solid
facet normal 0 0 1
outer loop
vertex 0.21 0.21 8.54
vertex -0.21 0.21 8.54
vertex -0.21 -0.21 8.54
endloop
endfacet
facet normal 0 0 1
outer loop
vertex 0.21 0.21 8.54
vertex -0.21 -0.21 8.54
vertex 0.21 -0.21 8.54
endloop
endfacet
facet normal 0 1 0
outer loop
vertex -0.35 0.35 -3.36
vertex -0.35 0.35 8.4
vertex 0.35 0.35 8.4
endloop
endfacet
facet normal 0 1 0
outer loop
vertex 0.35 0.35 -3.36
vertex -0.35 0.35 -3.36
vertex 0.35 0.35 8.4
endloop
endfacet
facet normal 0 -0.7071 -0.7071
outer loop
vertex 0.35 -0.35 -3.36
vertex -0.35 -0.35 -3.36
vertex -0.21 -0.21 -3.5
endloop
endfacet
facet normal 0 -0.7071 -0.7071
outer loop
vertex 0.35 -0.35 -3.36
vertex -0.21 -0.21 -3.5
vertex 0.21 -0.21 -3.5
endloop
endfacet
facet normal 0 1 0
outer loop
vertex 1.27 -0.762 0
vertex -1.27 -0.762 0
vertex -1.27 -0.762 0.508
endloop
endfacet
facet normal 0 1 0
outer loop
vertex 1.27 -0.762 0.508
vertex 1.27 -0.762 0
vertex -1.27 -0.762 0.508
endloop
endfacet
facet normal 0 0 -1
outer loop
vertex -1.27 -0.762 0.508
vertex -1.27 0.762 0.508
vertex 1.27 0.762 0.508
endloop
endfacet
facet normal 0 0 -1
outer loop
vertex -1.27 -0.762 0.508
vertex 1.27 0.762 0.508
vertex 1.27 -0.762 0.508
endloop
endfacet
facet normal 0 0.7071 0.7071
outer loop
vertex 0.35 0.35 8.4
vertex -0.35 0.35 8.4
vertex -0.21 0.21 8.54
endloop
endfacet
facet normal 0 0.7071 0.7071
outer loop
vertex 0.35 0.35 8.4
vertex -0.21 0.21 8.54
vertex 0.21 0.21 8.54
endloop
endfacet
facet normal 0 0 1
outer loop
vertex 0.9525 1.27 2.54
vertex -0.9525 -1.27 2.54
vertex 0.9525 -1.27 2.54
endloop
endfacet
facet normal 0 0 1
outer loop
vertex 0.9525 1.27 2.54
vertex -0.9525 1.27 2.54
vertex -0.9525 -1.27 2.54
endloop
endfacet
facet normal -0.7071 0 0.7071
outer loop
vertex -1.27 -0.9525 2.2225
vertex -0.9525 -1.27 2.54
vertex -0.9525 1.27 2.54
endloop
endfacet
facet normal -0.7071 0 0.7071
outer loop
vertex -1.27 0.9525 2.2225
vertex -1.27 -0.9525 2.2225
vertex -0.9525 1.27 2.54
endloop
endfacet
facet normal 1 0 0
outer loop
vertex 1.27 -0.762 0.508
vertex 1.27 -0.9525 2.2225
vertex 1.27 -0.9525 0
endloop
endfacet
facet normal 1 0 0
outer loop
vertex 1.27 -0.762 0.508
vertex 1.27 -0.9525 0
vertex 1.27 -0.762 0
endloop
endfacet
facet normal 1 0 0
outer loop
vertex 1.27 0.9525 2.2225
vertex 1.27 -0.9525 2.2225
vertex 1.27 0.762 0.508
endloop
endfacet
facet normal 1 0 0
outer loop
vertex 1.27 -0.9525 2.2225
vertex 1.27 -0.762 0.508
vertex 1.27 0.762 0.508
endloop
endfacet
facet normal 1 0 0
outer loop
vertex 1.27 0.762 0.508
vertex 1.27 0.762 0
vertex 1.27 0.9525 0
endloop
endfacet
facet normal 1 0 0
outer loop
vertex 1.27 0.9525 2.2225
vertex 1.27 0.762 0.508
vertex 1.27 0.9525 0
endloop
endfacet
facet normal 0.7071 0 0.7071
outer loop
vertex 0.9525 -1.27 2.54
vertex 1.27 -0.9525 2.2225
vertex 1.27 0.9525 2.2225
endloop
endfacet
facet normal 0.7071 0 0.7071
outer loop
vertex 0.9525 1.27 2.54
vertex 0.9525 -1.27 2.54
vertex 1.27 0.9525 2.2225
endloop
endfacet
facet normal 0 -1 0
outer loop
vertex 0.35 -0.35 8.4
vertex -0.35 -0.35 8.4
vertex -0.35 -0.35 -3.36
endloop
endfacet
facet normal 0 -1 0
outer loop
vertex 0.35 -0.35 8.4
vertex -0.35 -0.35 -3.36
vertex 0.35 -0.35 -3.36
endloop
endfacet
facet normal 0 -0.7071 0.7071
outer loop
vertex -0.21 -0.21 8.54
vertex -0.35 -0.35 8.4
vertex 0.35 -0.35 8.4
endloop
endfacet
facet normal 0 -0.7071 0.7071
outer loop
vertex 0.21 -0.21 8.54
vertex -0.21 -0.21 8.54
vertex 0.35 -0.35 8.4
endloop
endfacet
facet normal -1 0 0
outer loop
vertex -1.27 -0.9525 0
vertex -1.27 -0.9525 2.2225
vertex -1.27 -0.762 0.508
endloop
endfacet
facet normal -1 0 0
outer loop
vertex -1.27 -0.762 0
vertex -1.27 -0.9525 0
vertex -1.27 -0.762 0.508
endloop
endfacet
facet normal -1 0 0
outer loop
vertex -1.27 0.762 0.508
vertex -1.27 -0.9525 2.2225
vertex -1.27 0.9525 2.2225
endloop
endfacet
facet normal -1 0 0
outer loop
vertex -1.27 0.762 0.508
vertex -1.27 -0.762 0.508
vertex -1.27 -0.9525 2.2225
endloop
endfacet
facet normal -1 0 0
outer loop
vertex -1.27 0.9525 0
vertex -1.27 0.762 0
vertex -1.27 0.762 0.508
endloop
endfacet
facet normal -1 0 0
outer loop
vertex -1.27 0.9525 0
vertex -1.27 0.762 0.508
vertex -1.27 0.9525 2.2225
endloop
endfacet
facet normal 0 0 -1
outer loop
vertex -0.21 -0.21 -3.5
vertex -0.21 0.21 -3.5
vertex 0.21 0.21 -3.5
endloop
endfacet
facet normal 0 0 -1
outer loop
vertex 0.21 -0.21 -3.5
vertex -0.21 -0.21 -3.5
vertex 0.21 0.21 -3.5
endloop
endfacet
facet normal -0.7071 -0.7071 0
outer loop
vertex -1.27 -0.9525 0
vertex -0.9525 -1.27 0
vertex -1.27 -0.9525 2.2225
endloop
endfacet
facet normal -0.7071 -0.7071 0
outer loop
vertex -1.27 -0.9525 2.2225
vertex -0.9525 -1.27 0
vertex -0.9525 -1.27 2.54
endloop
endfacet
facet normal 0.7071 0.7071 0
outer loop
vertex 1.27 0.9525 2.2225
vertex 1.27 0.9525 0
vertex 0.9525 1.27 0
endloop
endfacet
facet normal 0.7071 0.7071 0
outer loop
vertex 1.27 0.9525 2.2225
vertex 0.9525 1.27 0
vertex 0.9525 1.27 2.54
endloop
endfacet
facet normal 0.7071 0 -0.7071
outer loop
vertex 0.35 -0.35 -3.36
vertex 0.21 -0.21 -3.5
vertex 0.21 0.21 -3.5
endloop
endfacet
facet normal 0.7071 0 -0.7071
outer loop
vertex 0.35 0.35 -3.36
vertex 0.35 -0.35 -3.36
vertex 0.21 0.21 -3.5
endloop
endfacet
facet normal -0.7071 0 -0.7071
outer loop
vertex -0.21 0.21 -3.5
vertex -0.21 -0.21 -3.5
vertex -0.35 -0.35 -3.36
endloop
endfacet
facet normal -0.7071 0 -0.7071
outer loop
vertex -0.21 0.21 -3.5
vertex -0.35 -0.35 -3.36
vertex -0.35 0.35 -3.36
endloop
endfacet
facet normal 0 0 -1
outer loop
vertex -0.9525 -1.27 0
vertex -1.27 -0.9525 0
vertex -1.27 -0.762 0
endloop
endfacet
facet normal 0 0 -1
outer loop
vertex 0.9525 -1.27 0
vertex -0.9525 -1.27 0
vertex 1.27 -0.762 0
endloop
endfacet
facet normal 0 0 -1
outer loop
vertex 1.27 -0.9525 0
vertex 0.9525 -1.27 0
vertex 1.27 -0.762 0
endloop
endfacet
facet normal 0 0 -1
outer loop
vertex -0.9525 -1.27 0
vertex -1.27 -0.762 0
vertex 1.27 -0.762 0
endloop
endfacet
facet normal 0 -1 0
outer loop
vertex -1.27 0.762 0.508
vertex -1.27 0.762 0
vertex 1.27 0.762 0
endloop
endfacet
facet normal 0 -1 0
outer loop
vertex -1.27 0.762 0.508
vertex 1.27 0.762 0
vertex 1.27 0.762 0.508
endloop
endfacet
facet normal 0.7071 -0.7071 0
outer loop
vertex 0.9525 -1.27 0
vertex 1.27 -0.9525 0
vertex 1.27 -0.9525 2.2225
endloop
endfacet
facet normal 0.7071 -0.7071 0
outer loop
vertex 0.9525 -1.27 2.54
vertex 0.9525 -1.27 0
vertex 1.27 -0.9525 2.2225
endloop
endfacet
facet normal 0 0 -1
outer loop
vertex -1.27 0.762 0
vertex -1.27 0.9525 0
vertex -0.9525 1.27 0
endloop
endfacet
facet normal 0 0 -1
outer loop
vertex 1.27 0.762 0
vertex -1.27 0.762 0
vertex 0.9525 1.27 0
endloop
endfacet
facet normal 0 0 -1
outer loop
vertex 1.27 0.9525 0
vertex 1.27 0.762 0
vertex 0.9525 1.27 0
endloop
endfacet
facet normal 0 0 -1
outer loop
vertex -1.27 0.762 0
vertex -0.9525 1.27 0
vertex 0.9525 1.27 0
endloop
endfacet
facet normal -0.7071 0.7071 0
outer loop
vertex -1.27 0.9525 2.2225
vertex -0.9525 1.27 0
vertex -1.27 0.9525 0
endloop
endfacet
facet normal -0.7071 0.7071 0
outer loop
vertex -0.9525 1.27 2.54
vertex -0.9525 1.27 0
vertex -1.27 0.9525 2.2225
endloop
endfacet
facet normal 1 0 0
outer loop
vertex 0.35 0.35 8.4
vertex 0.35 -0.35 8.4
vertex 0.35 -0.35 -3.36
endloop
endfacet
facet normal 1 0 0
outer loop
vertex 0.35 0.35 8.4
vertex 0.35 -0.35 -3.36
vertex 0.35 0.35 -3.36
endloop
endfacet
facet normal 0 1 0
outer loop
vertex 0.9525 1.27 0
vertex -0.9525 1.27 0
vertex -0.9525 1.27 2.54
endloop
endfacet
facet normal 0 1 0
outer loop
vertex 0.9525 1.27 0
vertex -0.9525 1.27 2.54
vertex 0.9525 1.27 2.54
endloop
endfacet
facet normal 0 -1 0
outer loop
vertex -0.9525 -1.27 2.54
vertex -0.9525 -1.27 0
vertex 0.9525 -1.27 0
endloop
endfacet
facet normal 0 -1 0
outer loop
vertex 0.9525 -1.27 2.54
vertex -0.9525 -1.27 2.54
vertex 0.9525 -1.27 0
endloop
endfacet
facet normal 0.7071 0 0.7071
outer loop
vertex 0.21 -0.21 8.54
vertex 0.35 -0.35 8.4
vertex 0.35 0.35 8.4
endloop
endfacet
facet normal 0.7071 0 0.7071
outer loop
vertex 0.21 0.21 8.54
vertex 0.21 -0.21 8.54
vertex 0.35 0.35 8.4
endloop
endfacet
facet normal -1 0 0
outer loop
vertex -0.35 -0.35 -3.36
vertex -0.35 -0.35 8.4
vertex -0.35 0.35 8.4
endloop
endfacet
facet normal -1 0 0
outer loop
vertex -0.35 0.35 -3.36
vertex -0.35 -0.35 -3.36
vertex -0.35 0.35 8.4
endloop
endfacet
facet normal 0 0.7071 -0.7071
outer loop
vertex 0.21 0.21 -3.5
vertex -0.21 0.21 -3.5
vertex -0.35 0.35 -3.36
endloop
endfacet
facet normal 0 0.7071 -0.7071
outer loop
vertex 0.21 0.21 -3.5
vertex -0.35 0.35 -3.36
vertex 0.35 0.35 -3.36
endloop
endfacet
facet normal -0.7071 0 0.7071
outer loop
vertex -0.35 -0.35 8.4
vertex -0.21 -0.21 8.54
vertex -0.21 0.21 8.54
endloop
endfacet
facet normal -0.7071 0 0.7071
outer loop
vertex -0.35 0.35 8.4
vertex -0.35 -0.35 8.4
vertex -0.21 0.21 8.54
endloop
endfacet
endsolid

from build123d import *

# Parameters (mm, degrees)
F4_W     = 2.54
F4_H     = 2.54
F4_W_2   = 0.7
F4_H_2   = 0.7
F5_DEPTH = 2.54
F6_DEPTH = 8.54
F7_DEPTH = 3.5
F8_W     = 1.524
F8_H     = 0.508
F9_DEPTH = 25
F10_SIZE = 0.3175
F11_SIZE = 0.14


with BuildPart() as f5:
    # F4 (on Top) → F5 (new body)
    with BuildSketch(Plane.XY):
        Rectangle(F4_W, F4_H)
        Rectangle(F4_W_2, F4_H_2, mode=Mode.SUBTRACT)
        Rectangle(F4_W_2, F4_H_2)
    extrude(amount=F5_DEPTH)

    # F8 (on face) → F9 (cut)
    with BuildSketch(Plane(origin=(-1.27, 0, 0), x_dir=(0, -1, 0), z_dir=(-1, 0, 0))):
        with Locations((0, 0.254)):
            Rectangle(F8_W, F8_H)
    extrude(amount=-F9_DEPTH, mode=Mode.SUBTRACT)

    # F10
    f10_edges = [f5.edges().sort_by_distance(p)[0] for p in [
        (-1.27, -1.27, 1.27),
        (1.27, -1.27, 1.27),
        (-1.27, 1.27, 1.27),
        (1.27, 1.27, 1.27),
        (1.27, 0, 2.54),
        (-1.27, 0, 2.54),
    ]]
    chamfer(f10_edges, length=F10_SIZE)


with BuildPart() as f6:
    # F4 (on Top) → F6 (new body)
    with BuildSketch(Plane.XY):
        Rectangle(F4_W_2, F4_H_2)
    extrude(amount=F6_DEPTH)

    # F4 (on Top) → F7 (join)
    with BuildSketch(Plane.XY):
        Rectangle(F4_W_2, F4_H_2)
    extrude(amount=-F7_DEPTH)

    # F11
    f11_edges = [f6.edges().sort_by_distance(p)[0] for p in [
        (-0.35, 0, 8.54),
        (0, 0.35, 8.54),
        (0, -0.35, 8.54),
        (0.35, 0, 8.54),
        (0, 0.35, -3.5),
        (-0.35, 0, -3.5),
        (0, -0.35, -3.5),
        (0.35, 0, -3.5),
    ]]
    chamfer(f11_edges, length=F11_SIZE)


solid = Compound([f5.part, f6.part])
